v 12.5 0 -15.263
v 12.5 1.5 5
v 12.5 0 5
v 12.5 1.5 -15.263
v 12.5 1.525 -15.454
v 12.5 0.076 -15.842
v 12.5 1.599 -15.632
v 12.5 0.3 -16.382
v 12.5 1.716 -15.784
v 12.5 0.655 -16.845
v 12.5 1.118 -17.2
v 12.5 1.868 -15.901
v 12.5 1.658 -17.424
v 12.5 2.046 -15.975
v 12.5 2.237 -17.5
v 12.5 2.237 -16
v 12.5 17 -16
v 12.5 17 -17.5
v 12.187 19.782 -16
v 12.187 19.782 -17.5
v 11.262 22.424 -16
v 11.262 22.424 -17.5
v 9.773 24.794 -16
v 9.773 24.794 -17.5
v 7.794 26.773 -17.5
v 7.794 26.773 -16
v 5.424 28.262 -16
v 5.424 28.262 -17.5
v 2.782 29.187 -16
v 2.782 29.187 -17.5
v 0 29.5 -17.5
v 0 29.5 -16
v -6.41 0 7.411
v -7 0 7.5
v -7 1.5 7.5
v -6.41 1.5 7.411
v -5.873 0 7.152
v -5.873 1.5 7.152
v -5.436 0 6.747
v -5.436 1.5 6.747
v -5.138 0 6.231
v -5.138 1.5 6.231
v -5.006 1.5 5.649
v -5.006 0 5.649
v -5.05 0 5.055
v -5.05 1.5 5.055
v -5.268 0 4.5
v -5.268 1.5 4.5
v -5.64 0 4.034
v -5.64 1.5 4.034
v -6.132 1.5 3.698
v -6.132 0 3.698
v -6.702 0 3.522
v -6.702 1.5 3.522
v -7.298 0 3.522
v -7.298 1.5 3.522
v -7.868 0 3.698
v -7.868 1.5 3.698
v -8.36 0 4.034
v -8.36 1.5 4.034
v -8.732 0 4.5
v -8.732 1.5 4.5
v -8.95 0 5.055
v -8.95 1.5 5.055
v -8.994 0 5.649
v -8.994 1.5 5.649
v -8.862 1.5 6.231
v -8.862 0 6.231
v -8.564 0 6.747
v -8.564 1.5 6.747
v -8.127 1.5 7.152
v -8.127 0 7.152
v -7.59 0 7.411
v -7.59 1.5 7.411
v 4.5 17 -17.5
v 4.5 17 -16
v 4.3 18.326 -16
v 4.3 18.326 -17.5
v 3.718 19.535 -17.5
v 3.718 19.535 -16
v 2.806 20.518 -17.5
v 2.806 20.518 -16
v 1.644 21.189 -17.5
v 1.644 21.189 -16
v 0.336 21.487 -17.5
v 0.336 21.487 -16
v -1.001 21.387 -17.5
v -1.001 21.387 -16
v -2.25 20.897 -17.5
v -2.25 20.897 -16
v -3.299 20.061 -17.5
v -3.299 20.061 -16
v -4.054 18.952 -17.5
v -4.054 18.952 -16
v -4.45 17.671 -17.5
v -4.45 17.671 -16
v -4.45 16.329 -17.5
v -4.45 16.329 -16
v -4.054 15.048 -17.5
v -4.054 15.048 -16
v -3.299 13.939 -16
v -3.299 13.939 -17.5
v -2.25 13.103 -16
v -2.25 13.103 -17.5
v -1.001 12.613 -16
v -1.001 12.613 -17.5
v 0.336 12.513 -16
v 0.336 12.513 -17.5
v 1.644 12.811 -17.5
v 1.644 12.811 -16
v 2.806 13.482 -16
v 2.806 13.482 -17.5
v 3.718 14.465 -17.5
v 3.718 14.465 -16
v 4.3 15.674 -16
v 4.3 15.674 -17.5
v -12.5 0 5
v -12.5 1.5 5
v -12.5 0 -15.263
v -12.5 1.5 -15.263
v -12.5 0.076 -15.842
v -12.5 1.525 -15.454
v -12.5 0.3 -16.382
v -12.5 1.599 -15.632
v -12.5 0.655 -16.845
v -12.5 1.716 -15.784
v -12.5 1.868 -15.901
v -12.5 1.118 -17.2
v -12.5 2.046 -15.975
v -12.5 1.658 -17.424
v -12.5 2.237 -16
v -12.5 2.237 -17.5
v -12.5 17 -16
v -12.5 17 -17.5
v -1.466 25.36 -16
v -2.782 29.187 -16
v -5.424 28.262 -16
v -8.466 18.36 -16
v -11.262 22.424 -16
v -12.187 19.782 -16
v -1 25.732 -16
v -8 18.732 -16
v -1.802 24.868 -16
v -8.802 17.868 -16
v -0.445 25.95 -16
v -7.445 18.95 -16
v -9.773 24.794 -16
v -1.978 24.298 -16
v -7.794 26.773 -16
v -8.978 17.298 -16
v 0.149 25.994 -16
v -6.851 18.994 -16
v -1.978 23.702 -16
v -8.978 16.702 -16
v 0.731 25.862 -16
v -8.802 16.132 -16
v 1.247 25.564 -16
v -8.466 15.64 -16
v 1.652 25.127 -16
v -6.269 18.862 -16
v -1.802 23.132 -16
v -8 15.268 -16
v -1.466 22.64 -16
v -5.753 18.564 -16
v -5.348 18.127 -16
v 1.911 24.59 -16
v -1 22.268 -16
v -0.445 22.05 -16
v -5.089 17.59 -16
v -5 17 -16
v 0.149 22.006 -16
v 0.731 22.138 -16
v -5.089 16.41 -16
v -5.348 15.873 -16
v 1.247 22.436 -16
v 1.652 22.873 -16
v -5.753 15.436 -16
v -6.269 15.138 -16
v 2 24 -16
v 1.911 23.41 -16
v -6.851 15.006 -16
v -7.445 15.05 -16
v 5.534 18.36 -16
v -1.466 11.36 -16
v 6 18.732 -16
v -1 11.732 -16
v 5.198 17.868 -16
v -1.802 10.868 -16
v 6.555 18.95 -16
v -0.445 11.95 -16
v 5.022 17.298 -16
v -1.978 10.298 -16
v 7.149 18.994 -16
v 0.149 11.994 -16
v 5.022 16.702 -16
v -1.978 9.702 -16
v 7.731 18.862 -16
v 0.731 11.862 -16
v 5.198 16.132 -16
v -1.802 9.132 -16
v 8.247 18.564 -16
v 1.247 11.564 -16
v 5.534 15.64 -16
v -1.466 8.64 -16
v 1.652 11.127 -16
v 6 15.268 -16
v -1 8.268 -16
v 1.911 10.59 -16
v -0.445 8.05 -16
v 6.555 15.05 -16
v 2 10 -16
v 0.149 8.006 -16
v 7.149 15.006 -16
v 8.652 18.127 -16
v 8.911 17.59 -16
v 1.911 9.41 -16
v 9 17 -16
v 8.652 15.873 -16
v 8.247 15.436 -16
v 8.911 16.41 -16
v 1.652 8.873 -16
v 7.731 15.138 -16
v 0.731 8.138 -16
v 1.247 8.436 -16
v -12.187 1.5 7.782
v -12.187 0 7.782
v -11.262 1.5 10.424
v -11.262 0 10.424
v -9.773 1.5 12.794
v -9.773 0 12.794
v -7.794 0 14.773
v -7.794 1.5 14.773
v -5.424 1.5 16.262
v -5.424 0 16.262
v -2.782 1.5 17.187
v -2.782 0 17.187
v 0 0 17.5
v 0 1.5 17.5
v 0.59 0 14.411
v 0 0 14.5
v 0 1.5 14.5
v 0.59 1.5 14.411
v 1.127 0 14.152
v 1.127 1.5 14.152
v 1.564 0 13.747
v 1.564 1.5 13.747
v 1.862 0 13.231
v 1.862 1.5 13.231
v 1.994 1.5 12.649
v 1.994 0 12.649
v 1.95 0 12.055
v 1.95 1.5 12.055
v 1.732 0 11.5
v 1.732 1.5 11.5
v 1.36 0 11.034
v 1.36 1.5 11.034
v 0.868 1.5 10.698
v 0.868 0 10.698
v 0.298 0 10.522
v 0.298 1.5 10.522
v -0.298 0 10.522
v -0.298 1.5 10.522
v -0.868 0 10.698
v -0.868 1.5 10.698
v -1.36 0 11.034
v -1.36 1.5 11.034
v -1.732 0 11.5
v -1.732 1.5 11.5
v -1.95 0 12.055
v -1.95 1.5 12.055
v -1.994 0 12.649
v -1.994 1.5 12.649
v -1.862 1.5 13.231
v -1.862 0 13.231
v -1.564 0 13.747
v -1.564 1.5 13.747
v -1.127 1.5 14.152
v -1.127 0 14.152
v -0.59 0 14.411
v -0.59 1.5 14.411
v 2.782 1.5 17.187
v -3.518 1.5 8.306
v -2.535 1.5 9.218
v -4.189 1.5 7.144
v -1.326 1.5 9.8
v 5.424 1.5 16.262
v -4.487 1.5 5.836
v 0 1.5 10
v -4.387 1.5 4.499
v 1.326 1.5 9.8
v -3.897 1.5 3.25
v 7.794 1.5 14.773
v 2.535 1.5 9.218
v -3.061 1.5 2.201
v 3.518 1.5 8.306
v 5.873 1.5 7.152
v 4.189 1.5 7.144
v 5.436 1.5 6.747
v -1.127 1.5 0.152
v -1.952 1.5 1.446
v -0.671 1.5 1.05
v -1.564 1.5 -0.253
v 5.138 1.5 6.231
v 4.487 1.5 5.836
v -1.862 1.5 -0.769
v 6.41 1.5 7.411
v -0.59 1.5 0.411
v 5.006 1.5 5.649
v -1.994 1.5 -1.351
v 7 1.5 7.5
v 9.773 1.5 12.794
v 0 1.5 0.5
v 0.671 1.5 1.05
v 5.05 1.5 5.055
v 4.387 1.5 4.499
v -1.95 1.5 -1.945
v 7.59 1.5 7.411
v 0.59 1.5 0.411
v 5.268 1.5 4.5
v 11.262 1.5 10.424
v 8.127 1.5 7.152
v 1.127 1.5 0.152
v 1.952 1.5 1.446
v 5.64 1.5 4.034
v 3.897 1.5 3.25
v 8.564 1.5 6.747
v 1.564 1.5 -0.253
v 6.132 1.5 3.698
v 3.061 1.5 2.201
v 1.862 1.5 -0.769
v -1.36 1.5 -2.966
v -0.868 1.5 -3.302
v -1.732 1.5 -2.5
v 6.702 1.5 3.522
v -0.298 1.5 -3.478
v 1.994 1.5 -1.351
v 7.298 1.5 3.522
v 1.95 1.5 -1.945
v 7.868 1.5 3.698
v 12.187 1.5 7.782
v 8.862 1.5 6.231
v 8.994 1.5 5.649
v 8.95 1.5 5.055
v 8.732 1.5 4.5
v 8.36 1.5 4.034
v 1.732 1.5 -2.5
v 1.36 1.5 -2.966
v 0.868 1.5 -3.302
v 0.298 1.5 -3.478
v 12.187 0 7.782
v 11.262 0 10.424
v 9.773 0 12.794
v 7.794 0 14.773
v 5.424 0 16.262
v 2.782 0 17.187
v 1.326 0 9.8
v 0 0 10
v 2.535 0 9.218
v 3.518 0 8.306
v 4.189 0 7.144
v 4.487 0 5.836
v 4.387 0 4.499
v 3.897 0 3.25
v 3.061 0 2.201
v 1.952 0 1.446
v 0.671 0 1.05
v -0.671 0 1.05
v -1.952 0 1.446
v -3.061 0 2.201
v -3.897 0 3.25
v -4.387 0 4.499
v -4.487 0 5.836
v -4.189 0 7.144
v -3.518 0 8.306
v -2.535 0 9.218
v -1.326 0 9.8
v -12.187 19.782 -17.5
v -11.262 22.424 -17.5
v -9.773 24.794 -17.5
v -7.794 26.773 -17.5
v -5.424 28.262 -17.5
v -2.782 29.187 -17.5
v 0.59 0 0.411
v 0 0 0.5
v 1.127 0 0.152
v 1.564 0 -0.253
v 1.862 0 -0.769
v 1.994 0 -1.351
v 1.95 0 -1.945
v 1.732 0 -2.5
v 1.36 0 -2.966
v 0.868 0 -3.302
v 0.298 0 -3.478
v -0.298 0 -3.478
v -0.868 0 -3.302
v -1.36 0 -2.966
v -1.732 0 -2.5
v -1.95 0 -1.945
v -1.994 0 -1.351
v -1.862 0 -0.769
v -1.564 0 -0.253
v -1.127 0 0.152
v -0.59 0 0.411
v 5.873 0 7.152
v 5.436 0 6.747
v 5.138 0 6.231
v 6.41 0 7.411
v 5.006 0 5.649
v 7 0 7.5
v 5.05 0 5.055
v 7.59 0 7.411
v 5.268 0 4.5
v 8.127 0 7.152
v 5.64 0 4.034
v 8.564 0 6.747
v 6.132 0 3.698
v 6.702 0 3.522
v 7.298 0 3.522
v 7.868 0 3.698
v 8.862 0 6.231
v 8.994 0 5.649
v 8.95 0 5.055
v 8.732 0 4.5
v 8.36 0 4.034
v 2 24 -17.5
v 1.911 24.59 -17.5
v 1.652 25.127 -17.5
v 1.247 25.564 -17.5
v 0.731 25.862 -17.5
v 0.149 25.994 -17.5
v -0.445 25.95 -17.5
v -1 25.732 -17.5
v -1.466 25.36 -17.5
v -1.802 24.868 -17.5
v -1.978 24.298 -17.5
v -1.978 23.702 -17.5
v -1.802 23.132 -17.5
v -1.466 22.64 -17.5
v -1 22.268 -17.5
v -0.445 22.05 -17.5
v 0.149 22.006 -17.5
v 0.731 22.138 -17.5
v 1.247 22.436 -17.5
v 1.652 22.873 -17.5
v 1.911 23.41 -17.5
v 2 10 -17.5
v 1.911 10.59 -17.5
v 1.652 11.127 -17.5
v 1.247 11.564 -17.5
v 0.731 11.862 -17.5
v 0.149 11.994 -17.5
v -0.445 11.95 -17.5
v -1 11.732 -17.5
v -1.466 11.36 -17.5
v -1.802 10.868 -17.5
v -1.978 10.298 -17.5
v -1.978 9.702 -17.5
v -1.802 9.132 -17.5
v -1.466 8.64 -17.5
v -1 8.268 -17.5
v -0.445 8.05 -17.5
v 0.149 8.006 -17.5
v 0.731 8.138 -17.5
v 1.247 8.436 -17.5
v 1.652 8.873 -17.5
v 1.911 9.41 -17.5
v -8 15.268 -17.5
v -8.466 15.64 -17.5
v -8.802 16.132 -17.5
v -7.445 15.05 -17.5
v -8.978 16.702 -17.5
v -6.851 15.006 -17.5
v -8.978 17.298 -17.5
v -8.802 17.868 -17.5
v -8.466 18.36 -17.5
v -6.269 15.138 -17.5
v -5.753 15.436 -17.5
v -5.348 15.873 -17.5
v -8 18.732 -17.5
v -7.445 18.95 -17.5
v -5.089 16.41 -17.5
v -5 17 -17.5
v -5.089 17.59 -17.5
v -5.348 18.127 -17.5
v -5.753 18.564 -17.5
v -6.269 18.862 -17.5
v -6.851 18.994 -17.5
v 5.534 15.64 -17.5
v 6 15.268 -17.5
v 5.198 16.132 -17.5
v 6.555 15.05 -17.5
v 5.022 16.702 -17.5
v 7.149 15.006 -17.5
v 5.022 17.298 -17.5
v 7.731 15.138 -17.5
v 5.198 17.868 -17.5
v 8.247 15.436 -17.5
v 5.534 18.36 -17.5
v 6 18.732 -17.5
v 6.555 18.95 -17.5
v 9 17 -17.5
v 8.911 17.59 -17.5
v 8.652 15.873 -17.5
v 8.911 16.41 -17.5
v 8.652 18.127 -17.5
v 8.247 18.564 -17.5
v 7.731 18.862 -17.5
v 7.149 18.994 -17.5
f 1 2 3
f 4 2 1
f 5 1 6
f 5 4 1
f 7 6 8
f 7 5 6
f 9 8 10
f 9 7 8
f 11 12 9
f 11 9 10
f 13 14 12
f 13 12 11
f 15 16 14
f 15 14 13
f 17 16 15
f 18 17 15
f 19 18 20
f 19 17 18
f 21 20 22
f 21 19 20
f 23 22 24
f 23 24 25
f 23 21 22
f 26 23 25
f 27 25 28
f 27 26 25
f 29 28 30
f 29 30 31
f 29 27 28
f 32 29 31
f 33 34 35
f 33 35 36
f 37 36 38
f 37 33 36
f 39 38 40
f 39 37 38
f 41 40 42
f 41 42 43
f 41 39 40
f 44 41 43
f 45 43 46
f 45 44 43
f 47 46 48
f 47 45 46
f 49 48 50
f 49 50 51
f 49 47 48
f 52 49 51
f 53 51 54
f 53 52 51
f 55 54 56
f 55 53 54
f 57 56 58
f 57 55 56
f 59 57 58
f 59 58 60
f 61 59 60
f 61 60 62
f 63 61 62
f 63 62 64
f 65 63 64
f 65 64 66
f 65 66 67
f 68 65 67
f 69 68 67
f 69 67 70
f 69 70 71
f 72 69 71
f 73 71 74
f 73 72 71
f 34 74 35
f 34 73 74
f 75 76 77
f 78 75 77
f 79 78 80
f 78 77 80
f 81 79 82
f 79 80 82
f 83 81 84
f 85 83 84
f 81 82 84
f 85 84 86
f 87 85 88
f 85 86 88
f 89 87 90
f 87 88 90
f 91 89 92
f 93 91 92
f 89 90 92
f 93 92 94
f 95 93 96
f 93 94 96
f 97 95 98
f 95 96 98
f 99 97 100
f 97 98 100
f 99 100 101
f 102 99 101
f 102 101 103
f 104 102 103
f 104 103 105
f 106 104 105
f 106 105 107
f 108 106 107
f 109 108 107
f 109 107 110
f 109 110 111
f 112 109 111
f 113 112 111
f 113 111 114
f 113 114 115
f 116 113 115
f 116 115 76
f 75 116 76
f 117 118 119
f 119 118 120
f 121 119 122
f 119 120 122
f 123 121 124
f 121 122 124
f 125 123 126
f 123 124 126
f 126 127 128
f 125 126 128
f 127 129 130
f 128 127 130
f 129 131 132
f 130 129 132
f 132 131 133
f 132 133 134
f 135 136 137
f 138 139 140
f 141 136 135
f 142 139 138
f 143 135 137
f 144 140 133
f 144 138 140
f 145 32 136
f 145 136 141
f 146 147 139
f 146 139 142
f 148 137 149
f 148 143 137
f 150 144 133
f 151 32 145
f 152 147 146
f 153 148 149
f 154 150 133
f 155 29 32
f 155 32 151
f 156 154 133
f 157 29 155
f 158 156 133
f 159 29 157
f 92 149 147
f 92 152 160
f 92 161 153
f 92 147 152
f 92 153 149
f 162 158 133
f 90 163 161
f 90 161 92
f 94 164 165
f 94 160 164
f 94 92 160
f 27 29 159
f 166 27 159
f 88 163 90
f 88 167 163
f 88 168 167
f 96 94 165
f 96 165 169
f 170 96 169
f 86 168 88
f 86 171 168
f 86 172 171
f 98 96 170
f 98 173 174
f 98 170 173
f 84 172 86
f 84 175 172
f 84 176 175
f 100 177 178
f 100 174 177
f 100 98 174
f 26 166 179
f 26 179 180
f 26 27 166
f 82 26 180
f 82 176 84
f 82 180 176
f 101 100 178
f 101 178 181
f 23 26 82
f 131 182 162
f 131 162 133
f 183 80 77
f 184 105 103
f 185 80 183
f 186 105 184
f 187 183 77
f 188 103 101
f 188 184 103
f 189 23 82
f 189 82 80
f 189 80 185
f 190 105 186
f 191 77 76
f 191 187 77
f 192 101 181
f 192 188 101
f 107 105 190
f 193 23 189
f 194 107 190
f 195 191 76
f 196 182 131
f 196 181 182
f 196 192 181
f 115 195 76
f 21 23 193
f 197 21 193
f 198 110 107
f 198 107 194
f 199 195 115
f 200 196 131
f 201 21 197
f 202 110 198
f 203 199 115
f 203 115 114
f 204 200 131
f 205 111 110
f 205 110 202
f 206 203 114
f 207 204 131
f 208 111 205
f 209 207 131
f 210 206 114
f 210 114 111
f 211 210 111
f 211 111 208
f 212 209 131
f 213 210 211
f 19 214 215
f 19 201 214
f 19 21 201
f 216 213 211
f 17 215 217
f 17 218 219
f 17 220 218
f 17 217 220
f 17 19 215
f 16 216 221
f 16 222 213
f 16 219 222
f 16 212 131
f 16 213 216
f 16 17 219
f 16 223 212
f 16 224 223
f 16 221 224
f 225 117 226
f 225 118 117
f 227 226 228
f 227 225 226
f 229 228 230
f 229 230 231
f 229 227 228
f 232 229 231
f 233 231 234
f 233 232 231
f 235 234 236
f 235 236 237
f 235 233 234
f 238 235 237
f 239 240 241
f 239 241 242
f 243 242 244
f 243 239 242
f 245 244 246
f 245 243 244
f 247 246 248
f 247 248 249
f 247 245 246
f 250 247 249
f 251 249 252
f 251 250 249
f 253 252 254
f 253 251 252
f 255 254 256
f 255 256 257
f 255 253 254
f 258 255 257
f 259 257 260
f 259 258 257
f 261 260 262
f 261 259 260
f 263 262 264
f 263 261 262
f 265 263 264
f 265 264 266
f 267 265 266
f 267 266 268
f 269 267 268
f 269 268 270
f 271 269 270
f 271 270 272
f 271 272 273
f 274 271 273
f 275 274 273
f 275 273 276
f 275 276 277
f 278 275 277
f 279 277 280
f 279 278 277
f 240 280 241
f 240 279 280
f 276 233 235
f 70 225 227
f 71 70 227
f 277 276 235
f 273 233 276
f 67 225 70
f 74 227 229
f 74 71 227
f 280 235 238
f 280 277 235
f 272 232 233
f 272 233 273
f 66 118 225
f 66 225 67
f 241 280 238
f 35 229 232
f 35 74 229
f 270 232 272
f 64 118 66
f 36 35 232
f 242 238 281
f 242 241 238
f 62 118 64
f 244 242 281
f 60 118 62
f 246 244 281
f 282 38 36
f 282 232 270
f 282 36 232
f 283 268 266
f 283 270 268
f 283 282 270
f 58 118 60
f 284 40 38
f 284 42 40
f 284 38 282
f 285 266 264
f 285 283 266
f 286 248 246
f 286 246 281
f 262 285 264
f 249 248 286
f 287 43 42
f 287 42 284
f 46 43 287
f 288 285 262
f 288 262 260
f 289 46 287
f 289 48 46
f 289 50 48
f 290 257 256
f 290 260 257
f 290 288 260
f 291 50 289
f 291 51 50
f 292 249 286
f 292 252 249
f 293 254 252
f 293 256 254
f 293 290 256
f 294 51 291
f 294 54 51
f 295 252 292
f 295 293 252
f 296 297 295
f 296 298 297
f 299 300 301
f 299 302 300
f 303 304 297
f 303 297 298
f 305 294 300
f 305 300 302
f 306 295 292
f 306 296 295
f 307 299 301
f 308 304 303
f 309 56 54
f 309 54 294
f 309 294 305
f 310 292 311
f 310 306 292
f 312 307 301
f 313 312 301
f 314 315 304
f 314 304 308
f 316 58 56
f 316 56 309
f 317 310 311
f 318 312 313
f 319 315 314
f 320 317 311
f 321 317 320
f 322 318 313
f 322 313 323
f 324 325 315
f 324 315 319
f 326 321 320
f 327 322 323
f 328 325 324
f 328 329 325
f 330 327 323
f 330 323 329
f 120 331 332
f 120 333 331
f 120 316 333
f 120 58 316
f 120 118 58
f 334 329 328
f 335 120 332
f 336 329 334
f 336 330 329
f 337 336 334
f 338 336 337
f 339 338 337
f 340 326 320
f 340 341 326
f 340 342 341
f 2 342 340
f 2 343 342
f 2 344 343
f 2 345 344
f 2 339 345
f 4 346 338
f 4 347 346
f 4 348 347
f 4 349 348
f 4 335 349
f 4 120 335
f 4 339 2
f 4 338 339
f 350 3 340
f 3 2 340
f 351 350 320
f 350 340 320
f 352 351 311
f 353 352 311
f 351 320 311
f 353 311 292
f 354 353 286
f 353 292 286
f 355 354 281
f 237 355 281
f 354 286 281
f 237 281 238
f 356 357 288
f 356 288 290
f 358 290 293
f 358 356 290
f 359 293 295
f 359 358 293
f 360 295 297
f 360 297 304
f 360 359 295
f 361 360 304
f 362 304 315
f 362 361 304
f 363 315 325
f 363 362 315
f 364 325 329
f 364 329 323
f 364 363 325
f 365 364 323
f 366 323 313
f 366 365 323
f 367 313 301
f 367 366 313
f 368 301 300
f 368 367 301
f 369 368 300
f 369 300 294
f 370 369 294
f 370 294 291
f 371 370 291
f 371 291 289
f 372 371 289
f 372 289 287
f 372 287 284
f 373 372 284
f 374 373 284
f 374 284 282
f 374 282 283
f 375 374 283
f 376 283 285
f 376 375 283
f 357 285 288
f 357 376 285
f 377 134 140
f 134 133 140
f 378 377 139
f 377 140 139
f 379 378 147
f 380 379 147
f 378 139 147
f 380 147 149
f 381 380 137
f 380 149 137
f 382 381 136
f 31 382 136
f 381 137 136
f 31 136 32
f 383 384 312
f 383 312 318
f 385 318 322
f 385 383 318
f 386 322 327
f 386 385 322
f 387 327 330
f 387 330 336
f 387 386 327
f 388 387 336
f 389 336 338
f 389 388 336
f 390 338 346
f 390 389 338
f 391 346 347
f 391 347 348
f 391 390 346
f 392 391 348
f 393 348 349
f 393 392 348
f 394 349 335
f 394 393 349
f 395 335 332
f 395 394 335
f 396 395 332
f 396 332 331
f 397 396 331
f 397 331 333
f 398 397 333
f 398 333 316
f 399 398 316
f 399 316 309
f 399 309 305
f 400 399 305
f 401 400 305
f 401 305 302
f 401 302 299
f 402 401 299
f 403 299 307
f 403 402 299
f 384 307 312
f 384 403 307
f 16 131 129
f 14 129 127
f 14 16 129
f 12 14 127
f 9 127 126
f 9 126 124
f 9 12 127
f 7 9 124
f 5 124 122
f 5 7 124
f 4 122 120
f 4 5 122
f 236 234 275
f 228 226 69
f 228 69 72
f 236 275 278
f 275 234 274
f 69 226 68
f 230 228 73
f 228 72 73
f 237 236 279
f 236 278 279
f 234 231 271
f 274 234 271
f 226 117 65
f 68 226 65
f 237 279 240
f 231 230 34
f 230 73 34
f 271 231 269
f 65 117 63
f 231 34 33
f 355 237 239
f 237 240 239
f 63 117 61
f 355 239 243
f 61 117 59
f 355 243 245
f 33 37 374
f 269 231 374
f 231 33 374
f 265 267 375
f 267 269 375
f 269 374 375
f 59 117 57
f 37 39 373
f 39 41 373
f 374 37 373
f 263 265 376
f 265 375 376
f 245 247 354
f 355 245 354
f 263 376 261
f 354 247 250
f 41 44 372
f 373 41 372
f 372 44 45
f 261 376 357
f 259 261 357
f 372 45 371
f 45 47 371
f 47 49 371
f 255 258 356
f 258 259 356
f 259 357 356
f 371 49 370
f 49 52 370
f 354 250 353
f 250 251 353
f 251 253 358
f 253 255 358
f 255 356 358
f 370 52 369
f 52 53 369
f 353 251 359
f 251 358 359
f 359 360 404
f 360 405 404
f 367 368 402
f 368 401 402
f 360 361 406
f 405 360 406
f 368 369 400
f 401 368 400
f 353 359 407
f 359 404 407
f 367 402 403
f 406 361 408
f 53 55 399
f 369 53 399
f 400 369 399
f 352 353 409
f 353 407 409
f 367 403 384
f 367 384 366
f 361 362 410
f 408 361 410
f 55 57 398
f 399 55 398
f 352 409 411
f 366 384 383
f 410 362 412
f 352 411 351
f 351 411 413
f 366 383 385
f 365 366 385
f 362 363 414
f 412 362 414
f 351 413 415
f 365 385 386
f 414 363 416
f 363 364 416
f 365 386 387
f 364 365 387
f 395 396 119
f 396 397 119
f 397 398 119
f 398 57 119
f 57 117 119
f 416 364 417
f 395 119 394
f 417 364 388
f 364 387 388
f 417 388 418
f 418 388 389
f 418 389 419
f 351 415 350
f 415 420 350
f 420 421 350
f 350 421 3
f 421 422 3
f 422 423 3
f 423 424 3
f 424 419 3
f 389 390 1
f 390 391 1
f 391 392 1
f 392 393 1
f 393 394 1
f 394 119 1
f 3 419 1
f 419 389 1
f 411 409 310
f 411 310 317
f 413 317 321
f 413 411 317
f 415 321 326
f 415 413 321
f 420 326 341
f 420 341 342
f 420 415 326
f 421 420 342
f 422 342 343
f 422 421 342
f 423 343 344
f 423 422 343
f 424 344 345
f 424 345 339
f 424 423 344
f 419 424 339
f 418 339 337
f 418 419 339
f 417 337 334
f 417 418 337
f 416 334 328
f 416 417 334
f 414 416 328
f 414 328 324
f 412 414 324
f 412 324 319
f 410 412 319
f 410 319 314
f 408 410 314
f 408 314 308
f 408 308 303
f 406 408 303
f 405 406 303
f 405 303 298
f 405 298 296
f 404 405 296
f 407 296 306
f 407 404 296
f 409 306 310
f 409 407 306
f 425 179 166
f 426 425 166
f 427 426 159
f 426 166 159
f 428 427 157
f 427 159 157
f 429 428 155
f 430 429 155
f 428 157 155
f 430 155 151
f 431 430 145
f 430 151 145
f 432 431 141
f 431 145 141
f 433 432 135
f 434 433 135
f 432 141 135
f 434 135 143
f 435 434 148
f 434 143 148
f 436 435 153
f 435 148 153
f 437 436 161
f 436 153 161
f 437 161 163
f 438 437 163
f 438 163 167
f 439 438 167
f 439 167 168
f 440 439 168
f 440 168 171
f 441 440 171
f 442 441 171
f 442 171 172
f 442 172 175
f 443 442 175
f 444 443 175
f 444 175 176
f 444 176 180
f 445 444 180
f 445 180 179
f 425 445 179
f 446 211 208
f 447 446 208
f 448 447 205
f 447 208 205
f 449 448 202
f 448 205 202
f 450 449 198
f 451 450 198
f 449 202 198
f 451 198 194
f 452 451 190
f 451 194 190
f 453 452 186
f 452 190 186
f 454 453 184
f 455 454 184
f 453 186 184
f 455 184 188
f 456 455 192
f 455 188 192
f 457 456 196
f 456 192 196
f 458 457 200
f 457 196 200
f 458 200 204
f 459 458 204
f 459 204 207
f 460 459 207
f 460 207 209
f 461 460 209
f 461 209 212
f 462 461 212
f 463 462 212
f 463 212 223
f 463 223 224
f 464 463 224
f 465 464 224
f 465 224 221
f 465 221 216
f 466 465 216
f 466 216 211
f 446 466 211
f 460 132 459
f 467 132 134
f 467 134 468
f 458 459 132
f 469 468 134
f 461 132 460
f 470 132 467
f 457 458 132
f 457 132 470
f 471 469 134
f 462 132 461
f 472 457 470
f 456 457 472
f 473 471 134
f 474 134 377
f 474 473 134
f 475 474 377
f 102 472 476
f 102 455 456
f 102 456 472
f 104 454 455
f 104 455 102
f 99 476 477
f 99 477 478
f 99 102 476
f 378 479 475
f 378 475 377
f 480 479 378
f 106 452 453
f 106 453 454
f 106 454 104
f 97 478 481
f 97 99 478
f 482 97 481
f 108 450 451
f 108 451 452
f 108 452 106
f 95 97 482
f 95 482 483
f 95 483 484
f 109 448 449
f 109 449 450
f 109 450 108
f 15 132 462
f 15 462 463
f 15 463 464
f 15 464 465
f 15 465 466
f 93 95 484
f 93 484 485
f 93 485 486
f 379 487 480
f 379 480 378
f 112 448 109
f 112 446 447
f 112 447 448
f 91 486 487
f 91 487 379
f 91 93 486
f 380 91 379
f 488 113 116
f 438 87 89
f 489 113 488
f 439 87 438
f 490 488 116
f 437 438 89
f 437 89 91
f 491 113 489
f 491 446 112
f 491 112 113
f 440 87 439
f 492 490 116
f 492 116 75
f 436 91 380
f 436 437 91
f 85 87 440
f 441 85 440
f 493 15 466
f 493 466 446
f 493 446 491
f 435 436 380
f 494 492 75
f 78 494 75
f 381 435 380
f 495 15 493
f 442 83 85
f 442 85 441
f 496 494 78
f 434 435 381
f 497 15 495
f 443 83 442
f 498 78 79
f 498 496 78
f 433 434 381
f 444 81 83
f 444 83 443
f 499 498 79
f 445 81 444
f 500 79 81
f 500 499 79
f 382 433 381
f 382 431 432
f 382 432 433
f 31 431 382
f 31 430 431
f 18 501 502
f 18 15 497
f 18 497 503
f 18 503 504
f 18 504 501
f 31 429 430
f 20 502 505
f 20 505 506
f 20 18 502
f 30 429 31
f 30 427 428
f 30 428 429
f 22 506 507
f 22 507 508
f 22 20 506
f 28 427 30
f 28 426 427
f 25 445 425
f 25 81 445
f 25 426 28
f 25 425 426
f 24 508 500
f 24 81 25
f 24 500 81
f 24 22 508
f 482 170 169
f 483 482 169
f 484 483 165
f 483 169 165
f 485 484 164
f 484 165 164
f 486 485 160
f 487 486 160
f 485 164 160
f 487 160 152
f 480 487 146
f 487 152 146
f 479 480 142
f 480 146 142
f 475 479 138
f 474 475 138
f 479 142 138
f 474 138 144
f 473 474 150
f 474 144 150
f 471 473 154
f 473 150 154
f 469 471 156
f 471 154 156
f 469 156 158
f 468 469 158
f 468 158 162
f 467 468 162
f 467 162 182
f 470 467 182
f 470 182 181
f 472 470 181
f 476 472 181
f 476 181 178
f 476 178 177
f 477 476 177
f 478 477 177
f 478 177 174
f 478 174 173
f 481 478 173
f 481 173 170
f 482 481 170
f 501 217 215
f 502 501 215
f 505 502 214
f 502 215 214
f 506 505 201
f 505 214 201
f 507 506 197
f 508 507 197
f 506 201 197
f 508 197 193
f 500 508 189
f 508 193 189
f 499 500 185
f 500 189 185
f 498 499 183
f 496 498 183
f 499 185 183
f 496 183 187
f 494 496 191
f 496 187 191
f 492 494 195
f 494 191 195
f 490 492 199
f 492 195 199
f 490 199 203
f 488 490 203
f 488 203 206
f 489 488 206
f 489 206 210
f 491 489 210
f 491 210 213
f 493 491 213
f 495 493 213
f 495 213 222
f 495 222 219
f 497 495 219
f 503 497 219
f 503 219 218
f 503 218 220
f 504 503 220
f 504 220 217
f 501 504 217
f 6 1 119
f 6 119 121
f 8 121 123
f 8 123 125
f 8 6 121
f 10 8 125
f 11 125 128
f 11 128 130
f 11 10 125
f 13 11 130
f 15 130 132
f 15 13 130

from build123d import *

# Parameters (mm, degrees)
SKETCH1_W                    = 25
SKETCH1_H                    = 35
SKETCH1_R                    = 4.5
SKETCH1_R_2                  = 2
BASE_FLANGE1_DEPTH           = 1.5
EDGE_FLANGE1_STRIP_W         = 7.4732
EDGE_FLANGE1_STRIP_H         = 1.5
EDGE_FLANGE1_STRIP_CUT_DEPTH = 25
EDGE_FLANGE1_DEPTH           = 25
SKETCH9_R                    = 4.5
SKETCH9_R_2                  = 2
CUT_EXTRUDE1_DEPTH           = 10
FILLET1_R                    = 12.5


# Sheet-metal steps are written as plain solids
with BuildPart() as part:
    # Sketch1 → Base-Flange1 (new body)
    with BuildSketch(Plane(origin=(0, 0, 0), x_dir=(1, 0, 0), z_dir=(0, 1, 0))):
        Rectangle(SKETCH1_W, SKETCH1_H)
        with Locations(Location((0, -5.5, 0), (0, 0, 270))):
            Circle(SKETCH1_R, mode=Mode.SUBTRACT)
        with Locations(Location((-7, -5.5, 0), (0, 0, 270))):
            Circle(SKETCH1_R_2, mode=Mode.SUBTRACT)
        with Locations(Location((0, -12.5, 0), (0, 0, 270))):
            Circle(SKETCH1_R_2, mode=Mode.SUBTRACT)
        with Locations(Location((7, -5.5, 0), (0, 0, 270))):
            Circle(SKETCH1_R_2, mode=Mode.SUBTRACT)
        with Locations(Location((0, 1.5, 0), (0, 0, 270))):
            Circle(SKETCH1_R_2, mode=Mode.SUBTRACT)
    extrude(amount=BASE_FLANGE1_DEPTH)

    # Edge-Flange1 strip (across the edge) → Edge-Flange1 strip cut (cut)
    with BuildSketch(Plane(origin=(12.5, 1.5, -17.5), x_dir=(0, 0, 1), z_dir=(-1, 0, 0))):
        with Locations((-1.5, -0.75)):
            Rectangle(EDGE_FLANGE1_STRIP_W, EDGE_FLANGE1_STRIP_H)
    extrude(amount=EDGE_FLANGE1_STRIP_CUT_DEPTH, mode=Mode.SUBTRACT)

    # Edge-Flange1 section (across the edge) → Edge-Flange1 (add)
    with BuildSketch(Plane(origin=(12.5, 1.5, -17.5), x_dir=(0, 0, 1), z_dir=(-1, 0, 0))):
        with BuildLine():
            Line((0, 0.7366), (0, 28))
            Line((0, 28), (1.5, 28))
            Line((1.5, 28), (1.5, 0.7366))
            ThreePointArc((1.5, 0.7366), (1.715745145, 0.215745145), (2.2366, 0))
            Line((2.2366, 0), (2.2366, -1.5))
            ThreePointArc((2.2366, -1.5), (0.655084973, -0.844915027), (0, 0.7366))
        make_face()
    extrude(amount=EDGE_FLANGE1_DEPTH)

    # Sketch9 → Cut-Extrude1 (cut)
    with BuildSketch(Plane.XY.offset(-16)):
        with Locations((0, 17)):
            Circle(SKETCH9_R)
        with Locations((-7, 17)):
            Circle(SKETCH9_R_2)
        with Locations((7, 17)):
            Circle(SKETCH9_R_2)
        with Locations((0, 24)):
            Circle(SKETCH9_R_2)
        with Locations((0, 10)):
            Circle(SKETCH9_R_2)
    extrude(amount=-CUT_EXTRUDE1_DEPTH, mode=Mode.SUBTRACT)

    # Fillet1
    fillet1_edges = [part.edges().sort_by_distance(p)[0] for p in [
        (12.5, 0.75, 17.5),
        (-12.5, 0.75, 17.5),
        (12.5, 29.5, -16.75),
        (-12.5, 29.5, -16.75),
    ]]
    fillet(fillet1_edges, radius=FILLET1_R - 0.0001)  # a hair under: the kernel refuses the full size


solid = part.part
